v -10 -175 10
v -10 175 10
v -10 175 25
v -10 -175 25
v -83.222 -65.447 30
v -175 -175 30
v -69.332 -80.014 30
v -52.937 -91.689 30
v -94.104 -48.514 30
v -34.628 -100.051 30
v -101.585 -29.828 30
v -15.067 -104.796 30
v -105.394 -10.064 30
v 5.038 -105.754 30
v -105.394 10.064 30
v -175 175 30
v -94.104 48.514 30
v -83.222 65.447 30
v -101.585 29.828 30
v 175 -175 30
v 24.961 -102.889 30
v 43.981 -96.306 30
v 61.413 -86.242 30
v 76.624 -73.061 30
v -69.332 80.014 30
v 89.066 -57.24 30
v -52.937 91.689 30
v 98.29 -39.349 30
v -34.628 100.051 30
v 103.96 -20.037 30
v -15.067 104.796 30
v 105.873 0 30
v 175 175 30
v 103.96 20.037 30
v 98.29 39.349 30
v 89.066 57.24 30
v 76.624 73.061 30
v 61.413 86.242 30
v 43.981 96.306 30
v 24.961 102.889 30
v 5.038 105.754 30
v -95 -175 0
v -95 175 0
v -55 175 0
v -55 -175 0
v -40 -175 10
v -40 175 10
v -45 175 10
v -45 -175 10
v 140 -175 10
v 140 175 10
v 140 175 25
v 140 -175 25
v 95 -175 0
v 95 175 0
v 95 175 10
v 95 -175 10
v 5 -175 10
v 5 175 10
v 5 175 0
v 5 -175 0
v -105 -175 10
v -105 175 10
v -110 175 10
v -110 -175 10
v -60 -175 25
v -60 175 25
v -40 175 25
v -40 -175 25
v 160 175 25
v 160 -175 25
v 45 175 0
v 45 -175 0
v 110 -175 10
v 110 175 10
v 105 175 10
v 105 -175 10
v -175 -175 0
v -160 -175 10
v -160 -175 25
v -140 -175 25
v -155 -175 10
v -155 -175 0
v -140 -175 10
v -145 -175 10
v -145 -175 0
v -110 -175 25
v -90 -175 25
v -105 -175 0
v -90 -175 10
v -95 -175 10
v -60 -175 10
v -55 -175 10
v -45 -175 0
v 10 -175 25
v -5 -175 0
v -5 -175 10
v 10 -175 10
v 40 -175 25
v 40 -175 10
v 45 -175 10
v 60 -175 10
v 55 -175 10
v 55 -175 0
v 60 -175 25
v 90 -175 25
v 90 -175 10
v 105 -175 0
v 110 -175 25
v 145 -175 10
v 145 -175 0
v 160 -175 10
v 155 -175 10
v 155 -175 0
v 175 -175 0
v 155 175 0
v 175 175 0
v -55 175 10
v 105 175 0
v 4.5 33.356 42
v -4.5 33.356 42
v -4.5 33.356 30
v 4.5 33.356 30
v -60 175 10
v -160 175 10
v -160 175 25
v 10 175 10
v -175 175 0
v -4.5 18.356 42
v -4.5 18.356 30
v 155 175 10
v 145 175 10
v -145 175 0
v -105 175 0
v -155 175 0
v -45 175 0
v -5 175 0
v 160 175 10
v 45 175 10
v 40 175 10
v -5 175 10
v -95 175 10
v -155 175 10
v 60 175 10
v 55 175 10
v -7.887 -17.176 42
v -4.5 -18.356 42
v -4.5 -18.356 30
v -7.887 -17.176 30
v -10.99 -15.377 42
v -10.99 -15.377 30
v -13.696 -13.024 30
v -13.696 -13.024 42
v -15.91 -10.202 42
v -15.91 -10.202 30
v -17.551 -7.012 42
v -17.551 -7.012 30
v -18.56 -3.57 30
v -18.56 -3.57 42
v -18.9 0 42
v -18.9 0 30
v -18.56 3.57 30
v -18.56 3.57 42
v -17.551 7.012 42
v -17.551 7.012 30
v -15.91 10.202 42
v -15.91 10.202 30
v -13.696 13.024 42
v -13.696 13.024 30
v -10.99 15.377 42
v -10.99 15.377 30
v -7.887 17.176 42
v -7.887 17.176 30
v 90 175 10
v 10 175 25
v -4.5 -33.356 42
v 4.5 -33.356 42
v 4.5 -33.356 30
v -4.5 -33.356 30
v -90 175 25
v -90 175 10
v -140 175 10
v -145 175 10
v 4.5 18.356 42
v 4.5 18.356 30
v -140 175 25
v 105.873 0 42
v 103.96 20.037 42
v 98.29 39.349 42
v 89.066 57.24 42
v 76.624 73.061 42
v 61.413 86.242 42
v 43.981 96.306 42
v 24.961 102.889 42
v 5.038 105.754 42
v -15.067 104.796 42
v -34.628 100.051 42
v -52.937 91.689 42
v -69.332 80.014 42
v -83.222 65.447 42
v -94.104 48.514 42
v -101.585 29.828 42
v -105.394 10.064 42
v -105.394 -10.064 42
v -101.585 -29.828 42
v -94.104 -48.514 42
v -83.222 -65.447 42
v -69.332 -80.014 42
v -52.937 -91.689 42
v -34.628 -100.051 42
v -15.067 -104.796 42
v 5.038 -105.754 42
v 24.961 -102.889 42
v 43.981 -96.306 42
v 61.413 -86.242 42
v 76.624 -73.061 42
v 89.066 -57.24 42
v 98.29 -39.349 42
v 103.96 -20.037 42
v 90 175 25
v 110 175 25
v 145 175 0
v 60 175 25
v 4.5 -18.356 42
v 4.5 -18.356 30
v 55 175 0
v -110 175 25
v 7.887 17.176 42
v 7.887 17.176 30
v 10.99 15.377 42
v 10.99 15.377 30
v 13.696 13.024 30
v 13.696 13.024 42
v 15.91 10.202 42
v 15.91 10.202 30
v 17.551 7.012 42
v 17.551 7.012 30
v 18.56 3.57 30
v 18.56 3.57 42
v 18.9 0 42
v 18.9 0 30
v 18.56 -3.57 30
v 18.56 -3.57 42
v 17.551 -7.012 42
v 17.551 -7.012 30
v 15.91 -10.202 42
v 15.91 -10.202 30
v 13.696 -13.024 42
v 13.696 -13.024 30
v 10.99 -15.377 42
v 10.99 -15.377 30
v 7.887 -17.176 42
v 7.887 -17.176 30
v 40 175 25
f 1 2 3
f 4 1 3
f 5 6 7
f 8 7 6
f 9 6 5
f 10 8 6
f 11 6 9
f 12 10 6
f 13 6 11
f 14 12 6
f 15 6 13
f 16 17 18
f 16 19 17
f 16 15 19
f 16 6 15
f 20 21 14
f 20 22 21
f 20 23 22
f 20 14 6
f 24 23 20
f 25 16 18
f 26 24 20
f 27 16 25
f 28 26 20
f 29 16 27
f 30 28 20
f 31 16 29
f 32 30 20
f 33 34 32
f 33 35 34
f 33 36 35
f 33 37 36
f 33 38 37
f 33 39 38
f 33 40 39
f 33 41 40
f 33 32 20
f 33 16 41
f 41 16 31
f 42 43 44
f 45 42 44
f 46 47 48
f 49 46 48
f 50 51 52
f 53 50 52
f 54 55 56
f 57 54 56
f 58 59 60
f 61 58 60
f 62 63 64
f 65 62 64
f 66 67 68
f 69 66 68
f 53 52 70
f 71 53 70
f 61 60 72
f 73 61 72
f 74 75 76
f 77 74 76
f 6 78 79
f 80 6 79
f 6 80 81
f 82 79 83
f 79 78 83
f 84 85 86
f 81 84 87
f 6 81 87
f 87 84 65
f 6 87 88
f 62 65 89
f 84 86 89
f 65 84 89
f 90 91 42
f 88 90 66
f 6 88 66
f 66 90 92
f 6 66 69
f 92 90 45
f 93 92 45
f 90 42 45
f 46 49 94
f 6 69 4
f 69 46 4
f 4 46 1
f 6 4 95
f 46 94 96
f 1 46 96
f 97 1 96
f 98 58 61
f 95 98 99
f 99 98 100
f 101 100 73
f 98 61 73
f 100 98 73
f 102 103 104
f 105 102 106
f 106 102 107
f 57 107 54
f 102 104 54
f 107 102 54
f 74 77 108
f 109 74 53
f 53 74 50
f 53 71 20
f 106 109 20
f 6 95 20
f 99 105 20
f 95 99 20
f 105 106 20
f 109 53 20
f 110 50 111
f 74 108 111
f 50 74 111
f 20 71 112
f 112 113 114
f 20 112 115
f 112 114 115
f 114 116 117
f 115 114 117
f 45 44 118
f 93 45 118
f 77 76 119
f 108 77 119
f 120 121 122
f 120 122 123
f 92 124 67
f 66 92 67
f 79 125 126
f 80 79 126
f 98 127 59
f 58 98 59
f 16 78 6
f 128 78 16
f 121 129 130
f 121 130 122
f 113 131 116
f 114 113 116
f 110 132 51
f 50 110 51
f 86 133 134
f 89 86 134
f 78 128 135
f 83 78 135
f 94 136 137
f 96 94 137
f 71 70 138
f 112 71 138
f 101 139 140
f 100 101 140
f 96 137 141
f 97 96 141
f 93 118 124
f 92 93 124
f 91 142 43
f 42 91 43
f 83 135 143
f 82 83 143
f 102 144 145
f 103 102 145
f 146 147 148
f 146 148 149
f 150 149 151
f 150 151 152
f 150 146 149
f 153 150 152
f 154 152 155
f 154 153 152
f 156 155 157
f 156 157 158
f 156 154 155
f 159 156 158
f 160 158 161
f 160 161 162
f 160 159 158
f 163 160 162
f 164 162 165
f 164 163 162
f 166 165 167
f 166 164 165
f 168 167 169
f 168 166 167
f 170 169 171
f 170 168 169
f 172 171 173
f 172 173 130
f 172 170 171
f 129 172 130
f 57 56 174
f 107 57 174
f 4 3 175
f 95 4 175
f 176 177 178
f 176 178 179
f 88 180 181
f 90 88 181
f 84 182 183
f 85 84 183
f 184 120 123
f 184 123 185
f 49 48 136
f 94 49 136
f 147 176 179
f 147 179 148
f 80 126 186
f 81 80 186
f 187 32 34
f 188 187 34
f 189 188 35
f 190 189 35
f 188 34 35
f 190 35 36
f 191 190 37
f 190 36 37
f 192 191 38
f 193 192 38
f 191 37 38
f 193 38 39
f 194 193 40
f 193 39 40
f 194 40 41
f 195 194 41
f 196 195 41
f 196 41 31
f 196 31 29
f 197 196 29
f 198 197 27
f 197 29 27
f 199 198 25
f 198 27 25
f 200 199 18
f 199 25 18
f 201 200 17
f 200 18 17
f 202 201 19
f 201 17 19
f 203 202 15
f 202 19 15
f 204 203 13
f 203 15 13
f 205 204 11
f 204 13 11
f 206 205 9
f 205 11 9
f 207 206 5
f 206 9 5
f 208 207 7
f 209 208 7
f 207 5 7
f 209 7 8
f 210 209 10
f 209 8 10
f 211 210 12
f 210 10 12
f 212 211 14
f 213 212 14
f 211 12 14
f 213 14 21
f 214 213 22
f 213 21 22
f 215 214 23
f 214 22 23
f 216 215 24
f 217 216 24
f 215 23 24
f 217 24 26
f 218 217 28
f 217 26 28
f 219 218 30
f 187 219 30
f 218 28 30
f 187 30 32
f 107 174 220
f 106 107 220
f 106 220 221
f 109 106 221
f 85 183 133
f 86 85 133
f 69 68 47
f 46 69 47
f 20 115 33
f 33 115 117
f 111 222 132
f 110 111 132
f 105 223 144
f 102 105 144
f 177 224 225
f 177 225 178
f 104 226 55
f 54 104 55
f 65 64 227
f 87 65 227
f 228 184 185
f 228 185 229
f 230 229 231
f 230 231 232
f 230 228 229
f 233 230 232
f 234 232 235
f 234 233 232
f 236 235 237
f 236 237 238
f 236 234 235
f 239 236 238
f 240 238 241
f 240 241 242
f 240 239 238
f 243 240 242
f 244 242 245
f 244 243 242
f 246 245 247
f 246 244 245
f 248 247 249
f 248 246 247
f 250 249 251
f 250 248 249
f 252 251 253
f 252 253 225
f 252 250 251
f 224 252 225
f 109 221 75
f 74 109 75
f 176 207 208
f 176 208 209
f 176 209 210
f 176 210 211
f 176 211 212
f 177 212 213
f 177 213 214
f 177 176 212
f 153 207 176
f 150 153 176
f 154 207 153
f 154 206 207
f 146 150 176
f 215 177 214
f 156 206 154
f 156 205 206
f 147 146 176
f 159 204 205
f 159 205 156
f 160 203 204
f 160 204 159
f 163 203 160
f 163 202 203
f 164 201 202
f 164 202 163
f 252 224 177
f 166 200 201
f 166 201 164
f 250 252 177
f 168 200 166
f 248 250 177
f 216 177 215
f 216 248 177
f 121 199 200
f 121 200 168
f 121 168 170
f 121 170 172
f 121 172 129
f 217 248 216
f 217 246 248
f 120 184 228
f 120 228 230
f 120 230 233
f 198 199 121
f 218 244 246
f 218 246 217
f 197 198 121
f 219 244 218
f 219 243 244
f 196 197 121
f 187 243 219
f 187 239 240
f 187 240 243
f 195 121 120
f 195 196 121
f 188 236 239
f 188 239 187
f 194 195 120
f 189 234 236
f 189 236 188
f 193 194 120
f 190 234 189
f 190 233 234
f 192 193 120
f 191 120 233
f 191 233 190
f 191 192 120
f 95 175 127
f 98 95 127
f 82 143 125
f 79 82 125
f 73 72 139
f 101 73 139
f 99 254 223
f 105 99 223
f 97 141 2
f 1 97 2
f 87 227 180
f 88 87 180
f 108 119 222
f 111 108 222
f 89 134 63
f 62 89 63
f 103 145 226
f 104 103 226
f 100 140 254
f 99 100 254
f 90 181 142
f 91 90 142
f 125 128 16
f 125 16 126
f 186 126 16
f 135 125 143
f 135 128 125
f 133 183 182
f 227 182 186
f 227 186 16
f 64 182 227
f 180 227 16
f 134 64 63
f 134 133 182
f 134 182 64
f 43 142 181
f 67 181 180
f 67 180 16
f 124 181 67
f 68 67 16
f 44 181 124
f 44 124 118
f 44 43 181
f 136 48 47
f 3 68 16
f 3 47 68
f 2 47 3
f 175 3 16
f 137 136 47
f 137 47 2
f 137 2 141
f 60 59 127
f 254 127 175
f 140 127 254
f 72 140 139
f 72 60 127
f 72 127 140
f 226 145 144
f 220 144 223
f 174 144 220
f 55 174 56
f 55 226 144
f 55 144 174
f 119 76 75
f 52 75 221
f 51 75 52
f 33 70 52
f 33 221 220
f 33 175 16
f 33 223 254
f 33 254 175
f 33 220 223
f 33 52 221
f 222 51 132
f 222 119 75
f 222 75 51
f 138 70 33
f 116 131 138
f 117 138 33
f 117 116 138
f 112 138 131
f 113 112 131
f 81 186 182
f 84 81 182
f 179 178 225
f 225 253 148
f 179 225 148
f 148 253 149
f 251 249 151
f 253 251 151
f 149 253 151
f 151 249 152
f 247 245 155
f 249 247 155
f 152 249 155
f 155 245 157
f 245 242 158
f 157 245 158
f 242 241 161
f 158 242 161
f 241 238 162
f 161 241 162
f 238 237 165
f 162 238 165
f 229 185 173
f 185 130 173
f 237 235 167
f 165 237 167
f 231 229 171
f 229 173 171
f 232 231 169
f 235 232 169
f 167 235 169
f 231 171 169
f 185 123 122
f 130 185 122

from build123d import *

# Parameters (mm, degrees)
SKETCH1_W           = 350
SKETCH1_H           = 350
BOSS_EXTRUDE1_DEPTH = 30
SKETCH2_R           = 105.873487711
BOSS_EXTRUDE2_DEPTH = 12
CUT_EXTRUDE1_DEPTH  = 12
CUT_EXTRUDE3_DEPTH  = 394.559398312


with BuildPart() as part:
    # Sketch1 → Boss-Extrude1 (new body)
    with BuildSketch(Plane.XY):
        Rectangle(SKETCH1_W, SKETCH1_H)
    extrude(amount=BOSS_EXTRUDE1_DEPTH)

    # Sketch2 → Boss-Extrude2 (add)
    with BuildSketch(Plane.XY.offset(30)):
        Circle(SKETCH2_R)
    extrude(amount=BOSS_EXTRUDE2_DEPTH)

    # Sketch3 → Cut-Extrude1 (cut)
    with BuildSketch(Plane.XY.offset(42)):
        with BuildLine():
            Line((-4.5, 18.356470249), (-4.5, 33.356470249))
            Line((-4.5, 33.356470249), (4.5, 33.356470249))
            Line((4.5, 33.356470249), (4.5, 18.356470249))
            ThreePointArc((4.5, 18.356470249), (18.9, 0), (4.5, -18.356470249))
            Line((4.5, -18.356470249), (4.5, -33.356470249))
            Line((4.5, -33.356470249), (-4.5, -33.356470249))
            Line((-4.5, -33.356470249), (-4.5, -18.356470249))
            ThreePointArc((-4.5, -18.356470249), (-18.9, 0), (-4.5, 18.356470249))
        make_face()
    extrude(amount=-CUT_EXTRUDE1_DEPTH, mode=Mode.SUBTRACT)

    # Sketch5 → Cut-Extrude3 (cut, through all)
    with BuildSketch(Plane(origin=(0, 175, 0), x_dir=(1, 0, 0), z_dir=(0, 1, 0))):
        Polygon((-145, 0), (-155, 0), (-155, -10), (-160, -10), (-160, -25), (-140, -25), (-140, -10), (-145, -10), align=None)
        Polygon((-95, 0), (-105, 0), (-105, -10), (-110, -10), (-110, -25), (-90, -25), (-90, -10), (-95, -10), align=None)
        Polygon((-45, 0), (-55, 0), (-55, -10), (-60, -10), (-60, -25), (-40, -25), (-40, -10), (-45, -10), align=None)
        Polygon((5, 0), (-5, 0), (-5, -10), (-10, -10), (-10, -25), (10, -25), (10, -10), (5, -10), align=None)
        Polygon((55, 0), (45, 0), (45, -10), (40, -10), (40, -25), (60, -25), (60, -10), (55, -10), align=None)
        Polygon((105, 0), (95, 0), (95, -10), (90, -10), (90, -25), (110, -25), (110, -10), (105, -10), align=None)
        Polygon((155, 0), (145, 0), (145, -10), (140, -10), (140, -25), (160, -25), (160, -10), (155, -10), align=None)
    extrude(amount=-CUT_EXTRUDE3_DEPTH, mode=Mode.SUBTRACT)


solid = part.part
